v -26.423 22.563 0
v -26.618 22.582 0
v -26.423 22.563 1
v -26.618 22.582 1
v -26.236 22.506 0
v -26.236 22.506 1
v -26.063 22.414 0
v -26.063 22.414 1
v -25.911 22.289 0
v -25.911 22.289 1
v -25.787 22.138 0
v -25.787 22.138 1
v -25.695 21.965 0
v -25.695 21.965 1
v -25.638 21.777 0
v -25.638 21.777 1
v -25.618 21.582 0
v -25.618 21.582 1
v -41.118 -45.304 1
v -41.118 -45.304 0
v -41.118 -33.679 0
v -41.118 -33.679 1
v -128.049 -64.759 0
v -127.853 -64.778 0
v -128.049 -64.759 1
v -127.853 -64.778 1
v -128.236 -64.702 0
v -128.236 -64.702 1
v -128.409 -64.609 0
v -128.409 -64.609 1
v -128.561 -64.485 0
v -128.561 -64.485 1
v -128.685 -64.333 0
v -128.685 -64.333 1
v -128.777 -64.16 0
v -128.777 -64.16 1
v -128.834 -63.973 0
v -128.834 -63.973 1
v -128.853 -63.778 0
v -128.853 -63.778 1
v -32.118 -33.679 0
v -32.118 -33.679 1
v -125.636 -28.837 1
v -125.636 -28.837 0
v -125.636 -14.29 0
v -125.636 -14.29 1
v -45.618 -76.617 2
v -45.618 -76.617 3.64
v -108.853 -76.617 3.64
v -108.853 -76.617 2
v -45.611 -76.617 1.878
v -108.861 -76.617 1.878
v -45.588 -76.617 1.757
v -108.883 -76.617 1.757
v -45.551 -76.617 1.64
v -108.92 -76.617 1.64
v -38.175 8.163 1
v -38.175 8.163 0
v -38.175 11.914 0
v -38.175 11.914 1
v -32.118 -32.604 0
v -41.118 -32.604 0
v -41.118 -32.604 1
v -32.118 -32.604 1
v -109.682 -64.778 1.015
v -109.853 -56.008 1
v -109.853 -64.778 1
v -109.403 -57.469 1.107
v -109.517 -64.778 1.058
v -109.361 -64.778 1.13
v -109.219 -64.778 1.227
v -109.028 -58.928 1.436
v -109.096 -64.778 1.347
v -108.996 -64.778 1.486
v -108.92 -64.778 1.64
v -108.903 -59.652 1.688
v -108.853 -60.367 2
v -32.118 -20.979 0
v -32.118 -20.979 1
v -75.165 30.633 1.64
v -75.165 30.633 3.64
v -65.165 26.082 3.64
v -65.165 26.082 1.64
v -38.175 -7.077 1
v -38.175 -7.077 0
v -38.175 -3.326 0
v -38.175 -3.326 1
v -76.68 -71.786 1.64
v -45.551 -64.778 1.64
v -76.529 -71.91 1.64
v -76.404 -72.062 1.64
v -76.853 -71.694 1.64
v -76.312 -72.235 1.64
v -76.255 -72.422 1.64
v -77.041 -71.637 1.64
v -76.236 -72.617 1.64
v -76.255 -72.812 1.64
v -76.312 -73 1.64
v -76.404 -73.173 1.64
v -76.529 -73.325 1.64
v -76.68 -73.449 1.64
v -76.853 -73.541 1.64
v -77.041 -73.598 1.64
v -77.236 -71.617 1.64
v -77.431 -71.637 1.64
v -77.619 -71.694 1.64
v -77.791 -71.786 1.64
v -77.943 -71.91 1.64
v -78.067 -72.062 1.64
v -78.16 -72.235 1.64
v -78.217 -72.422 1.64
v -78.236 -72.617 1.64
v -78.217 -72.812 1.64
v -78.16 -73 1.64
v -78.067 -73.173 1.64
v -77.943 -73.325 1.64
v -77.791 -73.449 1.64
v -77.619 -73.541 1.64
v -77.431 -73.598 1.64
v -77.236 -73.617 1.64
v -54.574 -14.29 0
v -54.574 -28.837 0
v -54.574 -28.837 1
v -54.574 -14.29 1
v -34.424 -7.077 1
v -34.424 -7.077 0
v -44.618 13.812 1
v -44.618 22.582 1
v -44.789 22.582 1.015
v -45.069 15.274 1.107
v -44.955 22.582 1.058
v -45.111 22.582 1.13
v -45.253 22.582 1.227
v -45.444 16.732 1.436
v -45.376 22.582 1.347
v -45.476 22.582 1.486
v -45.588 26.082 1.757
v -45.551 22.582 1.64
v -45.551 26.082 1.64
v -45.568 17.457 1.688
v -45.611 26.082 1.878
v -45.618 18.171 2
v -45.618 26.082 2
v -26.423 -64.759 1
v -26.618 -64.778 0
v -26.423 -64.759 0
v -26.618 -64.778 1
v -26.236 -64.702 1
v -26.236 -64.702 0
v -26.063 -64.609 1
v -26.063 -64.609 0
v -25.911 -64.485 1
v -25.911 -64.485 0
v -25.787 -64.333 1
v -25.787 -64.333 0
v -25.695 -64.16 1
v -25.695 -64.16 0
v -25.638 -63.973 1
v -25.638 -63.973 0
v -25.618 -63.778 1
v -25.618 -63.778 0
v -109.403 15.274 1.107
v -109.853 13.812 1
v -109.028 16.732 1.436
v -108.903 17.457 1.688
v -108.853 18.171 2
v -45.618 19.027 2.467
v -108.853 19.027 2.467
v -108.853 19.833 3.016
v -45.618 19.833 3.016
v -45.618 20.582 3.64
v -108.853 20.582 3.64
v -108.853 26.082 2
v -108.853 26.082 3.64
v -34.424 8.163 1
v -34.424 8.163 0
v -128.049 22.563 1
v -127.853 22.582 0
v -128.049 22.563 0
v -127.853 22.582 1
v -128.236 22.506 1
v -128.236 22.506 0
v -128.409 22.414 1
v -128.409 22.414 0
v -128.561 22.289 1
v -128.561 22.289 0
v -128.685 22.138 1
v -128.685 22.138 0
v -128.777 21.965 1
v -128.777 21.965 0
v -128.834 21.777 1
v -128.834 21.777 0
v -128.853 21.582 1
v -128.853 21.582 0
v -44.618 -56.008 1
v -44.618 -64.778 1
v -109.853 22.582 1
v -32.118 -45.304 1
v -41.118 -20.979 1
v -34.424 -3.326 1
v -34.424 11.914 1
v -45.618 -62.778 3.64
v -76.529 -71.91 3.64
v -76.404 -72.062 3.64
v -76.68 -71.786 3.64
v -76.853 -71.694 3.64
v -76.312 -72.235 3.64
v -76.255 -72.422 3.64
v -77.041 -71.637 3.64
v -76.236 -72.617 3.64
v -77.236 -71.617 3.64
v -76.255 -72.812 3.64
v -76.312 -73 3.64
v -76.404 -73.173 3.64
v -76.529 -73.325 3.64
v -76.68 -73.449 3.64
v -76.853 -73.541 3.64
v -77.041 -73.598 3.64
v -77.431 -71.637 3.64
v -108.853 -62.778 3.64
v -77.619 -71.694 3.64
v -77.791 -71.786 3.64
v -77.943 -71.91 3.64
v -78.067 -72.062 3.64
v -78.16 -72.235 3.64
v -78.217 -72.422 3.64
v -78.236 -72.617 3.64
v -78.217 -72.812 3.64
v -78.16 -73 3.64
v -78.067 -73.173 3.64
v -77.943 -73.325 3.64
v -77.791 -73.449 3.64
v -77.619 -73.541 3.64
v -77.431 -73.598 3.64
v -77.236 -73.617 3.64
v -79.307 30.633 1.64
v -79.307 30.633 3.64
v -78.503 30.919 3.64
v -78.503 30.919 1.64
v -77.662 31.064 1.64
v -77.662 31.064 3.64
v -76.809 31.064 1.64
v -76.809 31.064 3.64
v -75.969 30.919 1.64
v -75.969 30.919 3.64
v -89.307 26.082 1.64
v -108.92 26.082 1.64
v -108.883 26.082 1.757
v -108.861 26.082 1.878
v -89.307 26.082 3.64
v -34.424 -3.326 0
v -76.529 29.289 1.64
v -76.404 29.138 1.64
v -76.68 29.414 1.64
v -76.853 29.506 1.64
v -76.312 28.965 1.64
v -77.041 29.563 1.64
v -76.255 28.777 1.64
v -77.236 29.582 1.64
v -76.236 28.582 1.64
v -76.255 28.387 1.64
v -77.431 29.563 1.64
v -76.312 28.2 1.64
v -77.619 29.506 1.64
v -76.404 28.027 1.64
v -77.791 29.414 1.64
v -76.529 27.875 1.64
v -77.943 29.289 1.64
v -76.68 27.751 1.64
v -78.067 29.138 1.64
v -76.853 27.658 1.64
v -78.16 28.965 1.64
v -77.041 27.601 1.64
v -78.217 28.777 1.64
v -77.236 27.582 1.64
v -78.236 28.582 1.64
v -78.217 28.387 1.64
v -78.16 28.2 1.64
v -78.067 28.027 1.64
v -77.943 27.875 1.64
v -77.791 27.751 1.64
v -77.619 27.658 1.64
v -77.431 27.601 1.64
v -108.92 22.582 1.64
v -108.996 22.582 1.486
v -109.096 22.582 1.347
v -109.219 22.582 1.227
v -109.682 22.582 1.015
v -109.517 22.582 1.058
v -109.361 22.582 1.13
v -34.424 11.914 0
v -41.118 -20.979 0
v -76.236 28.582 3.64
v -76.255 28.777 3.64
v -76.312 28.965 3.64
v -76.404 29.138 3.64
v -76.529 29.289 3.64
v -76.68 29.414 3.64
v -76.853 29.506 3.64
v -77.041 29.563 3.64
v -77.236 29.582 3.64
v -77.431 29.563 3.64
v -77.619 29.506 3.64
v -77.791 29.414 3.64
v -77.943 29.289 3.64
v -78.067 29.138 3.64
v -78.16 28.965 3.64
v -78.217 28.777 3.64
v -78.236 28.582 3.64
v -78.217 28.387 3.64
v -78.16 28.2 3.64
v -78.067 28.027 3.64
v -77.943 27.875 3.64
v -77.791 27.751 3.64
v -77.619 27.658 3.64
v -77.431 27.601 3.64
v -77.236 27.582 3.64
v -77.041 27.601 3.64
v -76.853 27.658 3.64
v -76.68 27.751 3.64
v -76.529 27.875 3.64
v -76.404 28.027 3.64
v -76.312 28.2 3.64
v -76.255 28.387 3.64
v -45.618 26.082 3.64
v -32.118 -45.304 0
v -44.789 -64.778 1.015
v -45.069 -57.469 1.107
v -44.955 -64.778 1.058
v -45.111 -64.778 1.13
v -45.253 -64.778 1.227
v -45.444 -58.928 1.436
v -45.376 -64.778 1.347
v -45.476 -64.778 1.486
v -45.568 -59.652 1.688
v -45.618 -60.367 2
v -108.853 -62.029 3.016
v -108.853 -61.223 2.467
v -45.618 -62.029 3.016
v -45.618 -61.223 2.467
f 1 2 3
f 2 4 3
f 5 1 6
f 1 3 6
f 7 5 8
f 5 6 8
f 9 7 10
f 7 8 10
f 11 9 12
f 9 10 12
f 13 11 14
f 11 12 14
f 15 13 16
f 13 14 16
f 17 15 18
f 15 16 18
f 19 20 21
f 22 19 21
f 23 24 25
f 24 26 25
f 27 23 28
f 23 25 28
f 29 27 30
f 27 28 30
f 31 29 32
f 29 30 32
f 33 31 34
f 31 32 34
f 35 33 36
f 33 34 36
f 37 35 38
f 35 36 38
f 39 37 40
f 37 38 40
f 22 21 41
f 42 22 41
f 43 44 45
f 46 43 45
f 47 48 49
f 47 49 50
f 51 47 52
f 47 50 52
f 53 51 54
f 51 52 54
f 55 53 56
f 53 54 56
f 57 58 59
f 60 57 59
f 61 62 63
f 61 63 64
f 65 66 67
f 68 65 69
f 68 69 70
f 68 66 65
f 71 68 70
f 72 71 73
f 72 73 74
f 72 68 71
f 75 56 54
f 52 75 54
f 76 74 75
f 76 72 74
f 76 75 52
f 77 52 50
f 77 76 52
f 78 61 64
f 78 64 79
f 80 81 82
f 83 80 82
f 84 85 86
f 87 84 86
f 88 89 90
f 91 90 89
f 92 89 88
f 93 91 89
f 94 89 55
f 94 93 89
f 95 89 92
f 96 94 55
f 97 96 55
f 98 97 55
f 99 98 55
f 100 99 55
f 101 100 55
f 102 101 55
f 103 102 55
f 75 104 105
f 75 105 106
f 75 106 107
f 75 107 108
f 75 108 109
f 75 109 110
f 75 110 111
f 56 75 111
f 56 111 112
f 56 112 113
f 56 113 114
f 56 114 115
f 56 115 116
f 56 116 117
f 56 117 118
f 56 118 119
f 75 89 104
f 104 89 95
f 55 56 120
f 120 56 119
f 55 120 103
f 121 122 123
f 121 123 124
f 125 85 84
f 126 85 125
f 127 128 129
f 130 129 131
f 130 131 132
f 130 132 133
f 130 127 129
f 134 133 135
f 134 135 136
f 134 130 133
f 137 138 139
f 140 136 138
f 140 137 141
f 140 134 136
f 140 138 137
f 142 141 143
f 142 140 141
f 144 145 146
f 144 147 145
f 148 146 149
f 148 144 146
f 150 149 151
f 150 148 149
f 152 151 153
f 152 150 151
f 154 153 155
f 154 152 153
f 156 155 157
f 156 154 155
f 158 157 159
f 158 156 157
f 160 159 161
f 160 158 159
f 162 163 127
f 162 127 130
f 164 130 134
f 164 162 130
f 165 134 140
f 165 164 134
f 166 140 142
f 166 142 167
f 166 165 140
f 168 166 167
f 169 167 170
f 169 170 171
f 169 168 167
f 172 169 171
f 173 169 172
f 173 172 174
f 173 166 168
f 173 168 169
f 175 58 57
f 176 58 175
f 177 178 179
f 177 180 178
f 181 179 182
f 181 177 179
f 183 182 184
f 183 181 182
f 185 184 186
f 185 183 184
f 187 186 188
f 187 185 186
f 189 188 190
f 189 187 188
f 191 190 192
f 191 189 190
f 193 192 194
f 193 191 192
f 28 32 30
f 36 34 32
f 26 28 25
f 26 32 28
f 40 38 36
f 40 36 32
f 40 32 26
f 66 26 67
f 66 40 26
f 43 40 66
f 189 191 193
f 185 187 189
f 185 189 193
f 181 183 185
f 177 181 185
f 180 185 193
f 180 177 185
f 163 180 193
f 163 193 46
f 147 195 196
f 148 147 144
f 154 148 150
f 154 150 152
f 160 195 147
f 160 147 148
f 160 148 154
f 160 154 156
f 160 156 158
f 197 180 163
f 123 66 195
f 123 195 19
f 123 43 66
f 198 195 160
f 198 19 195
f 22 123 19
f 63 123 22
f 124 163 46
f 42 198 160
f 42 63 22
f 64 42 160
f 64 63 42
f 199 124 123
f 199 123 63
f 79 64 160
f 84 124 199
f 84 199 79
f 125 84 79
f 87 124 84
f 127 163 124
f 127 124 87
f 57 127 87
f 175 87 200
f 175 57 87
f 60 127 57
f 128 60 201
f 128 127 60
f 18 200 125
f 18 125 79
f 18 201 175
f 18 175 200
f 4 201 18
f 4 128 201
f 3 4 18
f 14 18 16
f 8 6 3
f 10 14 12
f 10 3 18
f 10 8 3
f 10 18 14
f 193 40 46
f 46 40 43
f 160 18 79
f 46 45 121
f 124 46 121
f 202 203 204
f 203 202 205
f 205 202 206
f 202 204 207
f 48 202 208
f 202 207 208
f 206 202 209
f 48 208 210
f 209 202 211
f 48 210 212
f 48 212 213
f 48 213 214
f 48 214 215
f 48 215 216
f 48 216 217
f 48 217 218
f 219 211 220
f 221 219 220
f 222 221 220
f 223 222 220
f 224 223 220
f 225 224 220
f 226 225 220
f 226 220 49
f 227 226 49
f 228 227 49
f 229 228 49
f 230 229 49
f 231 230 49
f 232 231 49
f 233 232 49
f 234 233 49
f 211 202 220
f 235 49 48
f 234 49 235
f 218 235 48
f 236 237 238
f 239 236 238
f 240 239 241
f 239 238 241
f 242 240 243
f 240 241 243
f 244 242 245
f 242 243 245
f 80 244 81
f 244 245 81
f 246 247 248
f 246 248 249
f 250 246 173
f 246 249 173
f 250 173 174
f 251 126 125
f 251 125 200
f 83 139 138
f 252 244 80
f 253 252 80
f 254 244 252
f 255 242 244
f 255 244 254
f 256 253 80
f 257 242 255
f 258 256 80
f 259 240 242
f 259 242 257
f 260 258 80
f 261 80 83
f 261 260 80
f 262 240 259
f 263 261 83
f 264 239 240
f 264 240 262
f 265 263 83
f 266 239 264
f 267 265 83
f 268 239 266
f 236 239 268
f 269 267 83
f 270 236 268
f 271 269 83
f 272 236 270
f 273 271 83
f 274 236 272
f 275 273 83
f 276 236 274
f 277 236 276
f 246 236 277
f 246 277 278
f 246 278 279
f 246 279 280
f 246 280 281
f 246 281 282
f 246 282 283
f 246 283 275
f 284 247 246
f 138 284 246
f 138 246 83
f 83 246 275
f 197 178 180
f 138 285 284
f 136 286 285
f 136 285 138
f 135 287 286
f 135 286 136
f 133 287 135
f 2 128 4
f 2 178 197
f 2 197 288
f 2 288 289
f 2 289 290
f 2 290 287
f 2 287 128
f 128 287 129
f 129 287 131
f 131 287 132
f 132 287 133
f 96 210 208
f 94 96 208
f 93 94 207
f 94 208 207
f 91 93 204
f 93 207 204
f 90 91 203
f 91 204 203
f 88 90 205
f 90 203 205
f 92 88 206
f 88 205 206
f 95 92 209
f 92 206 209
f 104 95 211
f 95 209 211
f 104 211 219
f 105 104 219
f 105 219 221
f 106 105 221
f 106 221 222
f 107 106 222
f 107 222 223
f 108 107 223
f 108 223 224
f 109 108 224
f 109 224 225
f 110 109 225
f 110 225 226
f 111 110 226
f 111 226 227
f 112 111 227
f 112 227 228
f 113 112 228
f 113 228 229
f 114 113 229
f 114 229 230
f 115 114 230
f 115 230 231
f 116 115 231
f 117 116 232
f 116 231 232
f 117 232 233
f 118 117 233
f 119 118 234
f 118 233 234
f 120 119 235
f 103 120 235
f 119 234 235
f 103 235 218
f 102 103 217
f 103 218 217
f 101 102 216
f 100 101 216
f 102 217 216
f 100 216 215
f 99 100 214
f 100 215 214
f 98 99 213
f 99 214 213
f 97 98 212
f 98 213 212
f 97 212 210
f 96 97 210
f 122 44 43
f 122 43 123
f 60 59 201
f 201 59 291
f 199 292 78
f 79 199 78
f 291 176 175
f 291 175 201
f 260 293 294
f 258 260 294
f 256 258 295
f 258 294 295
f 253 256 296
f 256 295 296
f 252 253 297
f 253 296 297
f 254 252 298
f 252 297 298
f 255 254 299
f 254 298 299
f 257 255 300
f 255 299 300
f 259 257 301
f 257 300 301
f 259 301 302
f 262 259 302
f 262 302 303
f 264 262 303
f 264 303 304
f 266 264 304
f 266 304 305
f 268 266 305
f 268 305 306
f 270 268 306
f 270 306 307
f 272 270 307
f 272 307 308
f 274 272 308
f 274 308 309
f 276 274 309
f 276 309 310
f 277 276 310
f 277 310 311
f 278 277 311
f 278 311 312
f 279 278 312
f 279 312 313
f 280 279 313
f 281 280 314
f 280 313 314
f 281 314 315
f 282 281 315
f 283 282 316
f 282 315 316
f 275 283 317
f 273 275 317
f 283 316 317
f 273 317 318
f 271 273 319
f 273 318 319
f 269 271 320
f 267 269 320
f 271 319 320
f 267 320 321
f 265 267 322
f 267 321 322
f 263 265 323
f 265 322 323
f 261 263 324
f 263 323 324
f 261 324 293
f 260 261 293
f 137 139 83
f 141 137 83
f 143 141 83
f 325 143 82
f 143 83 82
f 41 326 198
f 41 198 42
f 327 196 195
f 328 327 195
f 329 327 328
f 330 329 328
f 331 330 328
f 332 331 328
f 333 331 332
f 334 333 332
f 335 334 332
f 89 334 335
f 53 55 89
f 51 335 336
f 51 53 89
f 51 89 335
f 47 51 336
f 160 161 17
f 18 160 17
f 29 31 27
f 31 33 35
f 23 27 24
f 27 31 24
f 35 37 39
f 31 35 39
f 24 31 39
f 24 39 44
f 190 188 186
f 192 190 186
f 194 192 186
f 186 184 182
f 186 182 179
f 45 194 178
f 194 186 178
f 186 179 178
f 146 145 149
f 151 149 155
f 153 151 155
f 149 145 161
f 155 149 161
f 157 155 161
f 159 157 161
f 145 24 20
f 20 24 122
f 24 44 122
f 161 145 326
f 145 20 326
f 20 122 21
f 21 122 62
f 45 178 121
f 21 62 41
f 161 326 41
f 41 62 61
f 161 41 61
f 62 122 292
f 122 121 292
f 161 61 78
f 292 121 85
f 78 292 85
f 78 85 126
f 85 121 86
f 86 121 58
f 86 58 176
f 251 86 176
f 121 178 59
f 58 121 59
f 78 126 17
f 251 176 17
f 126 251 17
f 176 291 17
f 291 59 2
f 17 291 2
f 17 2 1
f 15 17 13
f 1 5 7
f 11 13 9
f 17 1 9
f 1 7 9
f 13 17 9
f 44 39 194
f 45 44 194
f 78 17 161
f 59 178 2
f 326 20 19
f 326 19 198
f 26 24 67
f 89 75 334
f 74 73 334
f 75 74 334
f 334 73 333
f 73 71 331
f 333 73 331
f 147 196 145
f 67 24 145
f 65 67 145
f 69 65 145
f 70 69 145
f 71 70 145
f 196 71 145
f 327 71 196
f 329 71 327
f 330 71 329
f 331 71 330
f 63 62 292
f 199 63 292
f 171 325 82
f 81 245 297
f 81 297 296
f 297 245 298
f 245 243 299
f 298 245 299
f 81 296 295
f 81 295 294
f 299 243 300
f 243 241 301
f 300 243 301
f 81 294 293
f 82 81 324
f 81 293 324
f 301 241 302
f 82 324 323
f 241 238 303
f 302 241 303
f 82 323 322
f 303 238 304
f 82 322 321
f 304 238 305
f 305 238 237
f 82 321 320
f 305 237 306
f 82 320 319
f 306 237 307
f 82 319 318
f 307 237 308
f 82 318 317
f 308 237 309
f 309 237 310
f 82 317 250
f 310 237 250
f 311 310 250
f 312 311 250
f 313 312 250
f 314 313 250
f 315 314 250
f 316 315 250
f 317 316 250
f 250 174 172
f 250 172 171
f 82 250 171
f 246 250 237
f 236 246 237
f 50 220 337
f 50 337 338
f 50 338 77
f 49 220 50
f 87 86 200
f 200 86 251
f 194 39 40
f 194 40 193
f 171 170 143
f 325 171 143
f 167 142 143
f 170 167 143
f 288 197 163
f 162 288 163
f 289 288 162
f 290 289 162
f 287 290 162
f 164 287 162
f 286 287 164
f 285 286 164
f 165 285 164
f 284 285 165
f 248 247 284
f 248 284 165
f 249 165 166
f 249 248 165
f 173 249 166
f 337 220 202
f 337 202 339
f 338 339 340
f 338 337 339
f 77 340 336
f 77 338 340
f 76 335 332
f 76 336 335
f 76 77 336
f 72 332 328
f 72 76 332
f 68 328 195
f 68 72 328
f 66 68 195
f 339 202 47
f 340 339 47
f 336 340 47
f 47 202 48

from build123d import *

# Parameters (mm, degrees)
SKETCH2_W           = 103.235
SKETCH2_H           = 87.36
SKETCH2_W_2         = 9
SKETCH2_H_2         = 11.625667
SKETCH2_W_3         = 3.751667
SKETCH2_H_3         = 3.751667
SKETCH2_W_4         = 71.061666
SKETCH2_H_4         = 14.546666
BOSS_EXTRUDE1_DEPTH = 1
BOSS_EXTRUDE2_START = -20
BOSS_EXTRUDE2_DEPTH = 63.235
FILLET1_R           = 10
FILLET2_R           = 1
FILLET4_R           = 1
BOSS_EXTRUDE3_DEPTH = 2
SKETCH5_R           = 1
CUT_EXTRUDE1_DEPTH  = 150.95559423


with BuildPart() as part:
    # Sketch2 → Boss-Extrude1 (new body)
    with BuildSketch(Plane.XY):
        with Locations((-77.235921563, -21.097735573)):
            Rectangle(SKETCH2_W, SKETCH2_H)
        with Locations((-36.618421563, -39.491569073)):
            Rectangle(SKETCH2_W_2, SKETCH2_H_2, mode=Mode.SUBTRACT)
        with Locations((-36.618421563, -26.791569073)):
            Rectangle(SKETCH2_W_2, SKETCH2_H_2, mode=Mode.SUBTRACT)
        with Locations((-36.299588063, -5.201569073)):
            Rectangle(SKETCH2_W_3, SKETCH2_H_3, mode=Mode.SUBTRACT)
        with Locations((-36.299588063, 10.038430927)):
            Rectangle(SKETCH2_W_3, SKETCH2_H_3, mode=Mode.SUBTRACT)
        with Locations((-90.105254563, -21.563402573)):
            Rectangle(SKETCH2_W_4, SKETCH2_H_4, mode=Mode.SUBTRACT)
    extrude(amount=BOSS_EXTRUDE1_DEPTH)

    # Sketch4 → Boss-Extrude2 (add)
    with BuildSketch(Plane.ZY.offset(128.853421563).offset(BOSS_EXTRUDE2_START)):
        Polygon((1.64, 23.082264427), (1.64, 26.082264427), (3.64, 26.082264427), (3.64, 20.582264427), (1, 20.582264427), (1, 22.582264427), (1.64, 22.582264427), align=None)
        Polygon((1.64, -76.617402573), (1.64, -73.617402573), (1.64, -64.777735573), (1, -64.777735573), (1, -62.777735573), (3.64, -62.777735573), (3.64, -76.617402573), align=None)
    extrude(amount=-BOSS_EXTRUDE2_DEPTH)

    # Fillet1
    # the kernel refuses this fillet: 10 mm, written as the material it adds along each edge
    with BuildSketch(Plane(origin=(-108.853421563, -62.777735573, 1), x_dir=(0, 1, 0), z_dir=(1, 0, 0))) as fillet1_piece_1:
        with BuildLine():
            CenterArc((6.769815359, 10), FILLET1_R, 227.39178247, 42.60821753)
            Line((0, 2.64), (-0.135396307, 2.4928))
            ThreePointArc((-0.135396307, 2.4928), (-0.2, 1.32), (-0.2, 0))
            Line((-0.2, 0), (0, -0.2))
            Line((0, -0.2), (6.769815359, -0.2))
            Line((6.769815359, -0.2), (6.769815359, 0))
        make_face()
    extrude(amount=63.235)
    with BuildSketch(Plane(origin=(-108.853421563, 20.582264427, 1), x_dir=(0, -1, 0), z_dir=(1, 0, 0))) as fillet1_piece_2:
        with BuildLine():
            CenterArc((6.769815359, -10), FILLET1_R, 90, 42.60821753)
            Line((0, -2.64), (-0.135396307, -2.4928))
            ThreePointArc((-0.135396307, -2.4928), (-0.2, -1.32), (-0.2, 0))
            Line((-0.2, 0), (0, 0.2))
            Line((0, 0.2), (6.769815359, 0.2))
            Line((6.769815359, 0.2), (6.769815359, 0))
        make_face()
    extrude(amount=63.235)

    # Fillet2
    fillet2_edges = [part.edges().sort_by_distance(p)[0] for p in [
        (-128.853421563, 22.582264427, 0.5),
        (-128.853421563, -64.777735573, 0.5),
        (-25.618421563, -64.777735573, 0.5),
        (-25.618421563, 22.582264427, 0.5),
    ]]
    fillet(fillet2_edges, radius=FILLET2_R)

    # Fillet4
    fillet4_edges = [part.edges().sort_by_distance(p)[0] for p in [
        (-45.618421563, -60.392827893, 1),
    ]]
    fillet(fillet4_edges, radius=FILLET4_R)
    fillet4_2_edges = [part.edges().sort_by_distance(p)[0] for p in [
        (-108.853421563, -60.392827893, 1),
    ]]
    fillet(fillet4_2_edges, radius=FILLET4_R)
    fillet4_3_edges = [part.edges().sort_by_distance(p)[0] for p in [
        (-45.618421563, 18.197356748, 1),
    ]]
    fillet(fillet4_3_edges, radius=FILLET4_R)
    fillet4_4_edges = [part.edges().sort_by_distance(p)[0] for p in [
        (-108.853421563, 18.197356748, 1),
    ]]
    fillet(fillet4_4_edges, radius=FILLET4_R)

    # Sketch6 → Boss-Extrude3 (add)
    with BuildSketch(Plane.XY.offset(3.64)):
        with BuildLine():
            Line((-89.306989375, 26.082264427), (-79.306989375, 30.633163033))
            ThreePointArc((-79.306989375, 30.633163033), (-77.235921563, 31.082264427), (-75.164853752, 30.633163033))
            Line((-75.164853752, 30.633163033), (-65.164853752, 26.082264427))
            Line((-65.164853752, 26.082264427), (-89.306989375, 26.082264427))
        make_face()
    extrude(amount=-BOSS_EXTRUDE3_DEPTH)

    # Sketch5 → Cut-Extrude1 (cut, through all)
    with BuildSketch(Plane.XY.offset(3.64)):
        with Locations((-77.235921563, -72.617402573)):
            Circle(SKETCH5_R)
        with Locations((-77.235921563, 28.582264427)):
            Circle(SKETCH5_R)
    extrude(amount=-CUT_EXTRUDE1_DEPTH, mode=Mode.SUBTRACT)


solid = part.part
